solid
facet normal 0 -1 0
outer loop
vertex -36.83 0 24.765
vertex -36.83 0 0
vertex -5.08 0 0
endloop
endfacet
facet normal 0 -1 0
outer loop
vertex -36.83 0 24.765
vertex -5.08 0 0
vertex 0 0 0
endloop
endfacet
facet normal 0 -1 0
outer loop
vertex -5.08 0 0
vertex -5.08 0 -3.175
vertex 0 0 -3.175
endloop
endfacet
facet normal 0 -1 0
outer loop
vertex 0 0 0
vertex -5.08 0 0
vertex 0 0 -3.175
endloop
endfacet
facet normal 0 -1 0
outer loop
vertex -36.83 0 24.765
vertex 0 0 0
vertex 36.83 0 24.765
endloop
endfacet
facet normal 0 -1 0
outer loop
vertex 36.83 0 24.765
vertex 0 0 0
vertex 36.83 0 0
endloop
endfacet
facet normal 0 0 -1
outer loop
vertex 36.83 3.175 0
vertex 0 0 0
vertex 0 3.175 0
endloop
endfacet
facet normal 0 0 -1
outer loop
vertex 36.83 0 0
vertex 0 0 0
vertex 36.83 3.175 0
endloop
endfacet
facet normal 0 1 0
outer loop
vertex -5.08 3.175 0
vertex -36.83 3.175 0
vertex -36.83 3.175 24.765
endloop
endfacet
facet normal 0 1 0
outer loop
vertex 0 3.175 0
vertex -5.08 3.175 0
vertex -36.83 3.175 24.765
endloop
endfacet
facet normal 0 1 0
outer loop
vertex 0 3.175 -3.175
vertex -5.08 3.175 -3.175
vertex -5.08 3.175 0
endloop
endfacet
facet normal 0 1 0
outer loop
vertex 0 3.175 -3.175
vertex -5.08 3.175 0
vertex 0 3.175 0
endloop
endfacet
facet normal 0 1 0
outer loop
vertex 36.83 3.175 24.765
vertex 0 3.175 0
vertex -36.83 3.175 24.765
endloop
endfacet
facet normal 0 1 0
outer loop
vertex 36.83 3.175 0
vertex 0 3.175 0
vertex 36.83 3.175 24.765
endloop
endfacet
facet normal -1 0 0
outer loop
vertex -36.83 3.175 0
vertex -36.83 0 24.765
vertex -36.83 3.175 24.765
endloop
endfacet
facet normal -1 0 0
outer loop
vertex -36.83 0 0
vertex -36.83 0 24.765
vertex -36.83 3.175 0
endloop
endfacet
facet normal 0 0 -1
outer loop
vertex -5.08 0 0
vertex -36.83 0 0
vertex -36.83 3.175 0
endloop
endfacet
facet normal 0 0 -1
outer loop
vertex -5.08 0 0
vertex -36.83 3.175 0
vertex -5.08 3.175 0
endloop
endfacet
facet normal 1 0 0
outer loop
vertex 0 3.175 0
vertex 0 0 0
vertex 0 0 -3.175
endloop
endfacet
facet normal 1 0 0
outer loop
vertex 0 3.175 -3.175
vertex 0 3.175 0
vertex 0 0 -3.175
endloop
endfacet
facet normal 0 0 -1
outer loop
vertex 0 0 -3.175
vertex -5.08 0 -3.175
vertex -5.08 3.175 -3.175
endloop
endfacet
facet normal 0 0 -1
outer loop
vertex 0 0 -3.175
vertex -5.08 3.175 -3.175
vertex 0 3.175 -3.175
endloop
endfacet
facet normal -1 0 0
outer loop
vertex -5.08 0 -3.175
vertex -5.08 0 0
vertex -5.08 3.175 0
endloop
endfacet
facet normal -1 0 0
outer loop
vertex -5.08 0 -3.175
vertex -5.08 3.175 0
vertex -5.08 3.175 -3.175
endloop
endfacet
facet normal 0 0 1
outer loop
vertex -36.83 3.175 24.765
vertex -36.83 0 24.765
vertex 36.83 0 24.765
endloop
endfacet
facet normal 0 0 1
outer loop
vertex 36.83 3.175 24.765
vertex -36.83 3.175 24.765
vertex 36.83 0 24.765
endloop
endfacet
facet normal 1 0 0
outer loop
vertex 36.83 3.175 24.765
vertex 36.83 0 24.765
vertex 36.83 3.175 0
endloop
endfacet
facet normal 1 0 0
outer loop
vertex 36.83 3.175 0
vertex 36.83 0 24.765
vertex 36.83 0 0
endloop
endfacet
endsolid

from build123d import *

# Parameters (mm, degrees)
SKETCH2_W           = 73.66
SKETCH2_H           = 24.765
SKETCH2_W_2         = 5.08
SKETCH2_H_2         = 3.175
BOSS_EXTRUDE1_DEPTH = 3.175


with BuildPart() as part:
    # Sketch2 → Boss-Extrude1 (new body)
    with BuildSketch(Plane(origin=(0, 0, 0), x_dir=(1, 0, 0), z_dir=(0, 1, 0))):
        with Locations((0, -12.3825)):
            Rectangle(SKETCH2_W, SKETCH2_H)
        with Locations((-2.54, 1.5875)):
            Rectangle(SKETCH2_W_2, SKETCH2_H_2)
    extrude(amount=BOSS_EXTRUDE1_DEPTH)


solid = part.part
